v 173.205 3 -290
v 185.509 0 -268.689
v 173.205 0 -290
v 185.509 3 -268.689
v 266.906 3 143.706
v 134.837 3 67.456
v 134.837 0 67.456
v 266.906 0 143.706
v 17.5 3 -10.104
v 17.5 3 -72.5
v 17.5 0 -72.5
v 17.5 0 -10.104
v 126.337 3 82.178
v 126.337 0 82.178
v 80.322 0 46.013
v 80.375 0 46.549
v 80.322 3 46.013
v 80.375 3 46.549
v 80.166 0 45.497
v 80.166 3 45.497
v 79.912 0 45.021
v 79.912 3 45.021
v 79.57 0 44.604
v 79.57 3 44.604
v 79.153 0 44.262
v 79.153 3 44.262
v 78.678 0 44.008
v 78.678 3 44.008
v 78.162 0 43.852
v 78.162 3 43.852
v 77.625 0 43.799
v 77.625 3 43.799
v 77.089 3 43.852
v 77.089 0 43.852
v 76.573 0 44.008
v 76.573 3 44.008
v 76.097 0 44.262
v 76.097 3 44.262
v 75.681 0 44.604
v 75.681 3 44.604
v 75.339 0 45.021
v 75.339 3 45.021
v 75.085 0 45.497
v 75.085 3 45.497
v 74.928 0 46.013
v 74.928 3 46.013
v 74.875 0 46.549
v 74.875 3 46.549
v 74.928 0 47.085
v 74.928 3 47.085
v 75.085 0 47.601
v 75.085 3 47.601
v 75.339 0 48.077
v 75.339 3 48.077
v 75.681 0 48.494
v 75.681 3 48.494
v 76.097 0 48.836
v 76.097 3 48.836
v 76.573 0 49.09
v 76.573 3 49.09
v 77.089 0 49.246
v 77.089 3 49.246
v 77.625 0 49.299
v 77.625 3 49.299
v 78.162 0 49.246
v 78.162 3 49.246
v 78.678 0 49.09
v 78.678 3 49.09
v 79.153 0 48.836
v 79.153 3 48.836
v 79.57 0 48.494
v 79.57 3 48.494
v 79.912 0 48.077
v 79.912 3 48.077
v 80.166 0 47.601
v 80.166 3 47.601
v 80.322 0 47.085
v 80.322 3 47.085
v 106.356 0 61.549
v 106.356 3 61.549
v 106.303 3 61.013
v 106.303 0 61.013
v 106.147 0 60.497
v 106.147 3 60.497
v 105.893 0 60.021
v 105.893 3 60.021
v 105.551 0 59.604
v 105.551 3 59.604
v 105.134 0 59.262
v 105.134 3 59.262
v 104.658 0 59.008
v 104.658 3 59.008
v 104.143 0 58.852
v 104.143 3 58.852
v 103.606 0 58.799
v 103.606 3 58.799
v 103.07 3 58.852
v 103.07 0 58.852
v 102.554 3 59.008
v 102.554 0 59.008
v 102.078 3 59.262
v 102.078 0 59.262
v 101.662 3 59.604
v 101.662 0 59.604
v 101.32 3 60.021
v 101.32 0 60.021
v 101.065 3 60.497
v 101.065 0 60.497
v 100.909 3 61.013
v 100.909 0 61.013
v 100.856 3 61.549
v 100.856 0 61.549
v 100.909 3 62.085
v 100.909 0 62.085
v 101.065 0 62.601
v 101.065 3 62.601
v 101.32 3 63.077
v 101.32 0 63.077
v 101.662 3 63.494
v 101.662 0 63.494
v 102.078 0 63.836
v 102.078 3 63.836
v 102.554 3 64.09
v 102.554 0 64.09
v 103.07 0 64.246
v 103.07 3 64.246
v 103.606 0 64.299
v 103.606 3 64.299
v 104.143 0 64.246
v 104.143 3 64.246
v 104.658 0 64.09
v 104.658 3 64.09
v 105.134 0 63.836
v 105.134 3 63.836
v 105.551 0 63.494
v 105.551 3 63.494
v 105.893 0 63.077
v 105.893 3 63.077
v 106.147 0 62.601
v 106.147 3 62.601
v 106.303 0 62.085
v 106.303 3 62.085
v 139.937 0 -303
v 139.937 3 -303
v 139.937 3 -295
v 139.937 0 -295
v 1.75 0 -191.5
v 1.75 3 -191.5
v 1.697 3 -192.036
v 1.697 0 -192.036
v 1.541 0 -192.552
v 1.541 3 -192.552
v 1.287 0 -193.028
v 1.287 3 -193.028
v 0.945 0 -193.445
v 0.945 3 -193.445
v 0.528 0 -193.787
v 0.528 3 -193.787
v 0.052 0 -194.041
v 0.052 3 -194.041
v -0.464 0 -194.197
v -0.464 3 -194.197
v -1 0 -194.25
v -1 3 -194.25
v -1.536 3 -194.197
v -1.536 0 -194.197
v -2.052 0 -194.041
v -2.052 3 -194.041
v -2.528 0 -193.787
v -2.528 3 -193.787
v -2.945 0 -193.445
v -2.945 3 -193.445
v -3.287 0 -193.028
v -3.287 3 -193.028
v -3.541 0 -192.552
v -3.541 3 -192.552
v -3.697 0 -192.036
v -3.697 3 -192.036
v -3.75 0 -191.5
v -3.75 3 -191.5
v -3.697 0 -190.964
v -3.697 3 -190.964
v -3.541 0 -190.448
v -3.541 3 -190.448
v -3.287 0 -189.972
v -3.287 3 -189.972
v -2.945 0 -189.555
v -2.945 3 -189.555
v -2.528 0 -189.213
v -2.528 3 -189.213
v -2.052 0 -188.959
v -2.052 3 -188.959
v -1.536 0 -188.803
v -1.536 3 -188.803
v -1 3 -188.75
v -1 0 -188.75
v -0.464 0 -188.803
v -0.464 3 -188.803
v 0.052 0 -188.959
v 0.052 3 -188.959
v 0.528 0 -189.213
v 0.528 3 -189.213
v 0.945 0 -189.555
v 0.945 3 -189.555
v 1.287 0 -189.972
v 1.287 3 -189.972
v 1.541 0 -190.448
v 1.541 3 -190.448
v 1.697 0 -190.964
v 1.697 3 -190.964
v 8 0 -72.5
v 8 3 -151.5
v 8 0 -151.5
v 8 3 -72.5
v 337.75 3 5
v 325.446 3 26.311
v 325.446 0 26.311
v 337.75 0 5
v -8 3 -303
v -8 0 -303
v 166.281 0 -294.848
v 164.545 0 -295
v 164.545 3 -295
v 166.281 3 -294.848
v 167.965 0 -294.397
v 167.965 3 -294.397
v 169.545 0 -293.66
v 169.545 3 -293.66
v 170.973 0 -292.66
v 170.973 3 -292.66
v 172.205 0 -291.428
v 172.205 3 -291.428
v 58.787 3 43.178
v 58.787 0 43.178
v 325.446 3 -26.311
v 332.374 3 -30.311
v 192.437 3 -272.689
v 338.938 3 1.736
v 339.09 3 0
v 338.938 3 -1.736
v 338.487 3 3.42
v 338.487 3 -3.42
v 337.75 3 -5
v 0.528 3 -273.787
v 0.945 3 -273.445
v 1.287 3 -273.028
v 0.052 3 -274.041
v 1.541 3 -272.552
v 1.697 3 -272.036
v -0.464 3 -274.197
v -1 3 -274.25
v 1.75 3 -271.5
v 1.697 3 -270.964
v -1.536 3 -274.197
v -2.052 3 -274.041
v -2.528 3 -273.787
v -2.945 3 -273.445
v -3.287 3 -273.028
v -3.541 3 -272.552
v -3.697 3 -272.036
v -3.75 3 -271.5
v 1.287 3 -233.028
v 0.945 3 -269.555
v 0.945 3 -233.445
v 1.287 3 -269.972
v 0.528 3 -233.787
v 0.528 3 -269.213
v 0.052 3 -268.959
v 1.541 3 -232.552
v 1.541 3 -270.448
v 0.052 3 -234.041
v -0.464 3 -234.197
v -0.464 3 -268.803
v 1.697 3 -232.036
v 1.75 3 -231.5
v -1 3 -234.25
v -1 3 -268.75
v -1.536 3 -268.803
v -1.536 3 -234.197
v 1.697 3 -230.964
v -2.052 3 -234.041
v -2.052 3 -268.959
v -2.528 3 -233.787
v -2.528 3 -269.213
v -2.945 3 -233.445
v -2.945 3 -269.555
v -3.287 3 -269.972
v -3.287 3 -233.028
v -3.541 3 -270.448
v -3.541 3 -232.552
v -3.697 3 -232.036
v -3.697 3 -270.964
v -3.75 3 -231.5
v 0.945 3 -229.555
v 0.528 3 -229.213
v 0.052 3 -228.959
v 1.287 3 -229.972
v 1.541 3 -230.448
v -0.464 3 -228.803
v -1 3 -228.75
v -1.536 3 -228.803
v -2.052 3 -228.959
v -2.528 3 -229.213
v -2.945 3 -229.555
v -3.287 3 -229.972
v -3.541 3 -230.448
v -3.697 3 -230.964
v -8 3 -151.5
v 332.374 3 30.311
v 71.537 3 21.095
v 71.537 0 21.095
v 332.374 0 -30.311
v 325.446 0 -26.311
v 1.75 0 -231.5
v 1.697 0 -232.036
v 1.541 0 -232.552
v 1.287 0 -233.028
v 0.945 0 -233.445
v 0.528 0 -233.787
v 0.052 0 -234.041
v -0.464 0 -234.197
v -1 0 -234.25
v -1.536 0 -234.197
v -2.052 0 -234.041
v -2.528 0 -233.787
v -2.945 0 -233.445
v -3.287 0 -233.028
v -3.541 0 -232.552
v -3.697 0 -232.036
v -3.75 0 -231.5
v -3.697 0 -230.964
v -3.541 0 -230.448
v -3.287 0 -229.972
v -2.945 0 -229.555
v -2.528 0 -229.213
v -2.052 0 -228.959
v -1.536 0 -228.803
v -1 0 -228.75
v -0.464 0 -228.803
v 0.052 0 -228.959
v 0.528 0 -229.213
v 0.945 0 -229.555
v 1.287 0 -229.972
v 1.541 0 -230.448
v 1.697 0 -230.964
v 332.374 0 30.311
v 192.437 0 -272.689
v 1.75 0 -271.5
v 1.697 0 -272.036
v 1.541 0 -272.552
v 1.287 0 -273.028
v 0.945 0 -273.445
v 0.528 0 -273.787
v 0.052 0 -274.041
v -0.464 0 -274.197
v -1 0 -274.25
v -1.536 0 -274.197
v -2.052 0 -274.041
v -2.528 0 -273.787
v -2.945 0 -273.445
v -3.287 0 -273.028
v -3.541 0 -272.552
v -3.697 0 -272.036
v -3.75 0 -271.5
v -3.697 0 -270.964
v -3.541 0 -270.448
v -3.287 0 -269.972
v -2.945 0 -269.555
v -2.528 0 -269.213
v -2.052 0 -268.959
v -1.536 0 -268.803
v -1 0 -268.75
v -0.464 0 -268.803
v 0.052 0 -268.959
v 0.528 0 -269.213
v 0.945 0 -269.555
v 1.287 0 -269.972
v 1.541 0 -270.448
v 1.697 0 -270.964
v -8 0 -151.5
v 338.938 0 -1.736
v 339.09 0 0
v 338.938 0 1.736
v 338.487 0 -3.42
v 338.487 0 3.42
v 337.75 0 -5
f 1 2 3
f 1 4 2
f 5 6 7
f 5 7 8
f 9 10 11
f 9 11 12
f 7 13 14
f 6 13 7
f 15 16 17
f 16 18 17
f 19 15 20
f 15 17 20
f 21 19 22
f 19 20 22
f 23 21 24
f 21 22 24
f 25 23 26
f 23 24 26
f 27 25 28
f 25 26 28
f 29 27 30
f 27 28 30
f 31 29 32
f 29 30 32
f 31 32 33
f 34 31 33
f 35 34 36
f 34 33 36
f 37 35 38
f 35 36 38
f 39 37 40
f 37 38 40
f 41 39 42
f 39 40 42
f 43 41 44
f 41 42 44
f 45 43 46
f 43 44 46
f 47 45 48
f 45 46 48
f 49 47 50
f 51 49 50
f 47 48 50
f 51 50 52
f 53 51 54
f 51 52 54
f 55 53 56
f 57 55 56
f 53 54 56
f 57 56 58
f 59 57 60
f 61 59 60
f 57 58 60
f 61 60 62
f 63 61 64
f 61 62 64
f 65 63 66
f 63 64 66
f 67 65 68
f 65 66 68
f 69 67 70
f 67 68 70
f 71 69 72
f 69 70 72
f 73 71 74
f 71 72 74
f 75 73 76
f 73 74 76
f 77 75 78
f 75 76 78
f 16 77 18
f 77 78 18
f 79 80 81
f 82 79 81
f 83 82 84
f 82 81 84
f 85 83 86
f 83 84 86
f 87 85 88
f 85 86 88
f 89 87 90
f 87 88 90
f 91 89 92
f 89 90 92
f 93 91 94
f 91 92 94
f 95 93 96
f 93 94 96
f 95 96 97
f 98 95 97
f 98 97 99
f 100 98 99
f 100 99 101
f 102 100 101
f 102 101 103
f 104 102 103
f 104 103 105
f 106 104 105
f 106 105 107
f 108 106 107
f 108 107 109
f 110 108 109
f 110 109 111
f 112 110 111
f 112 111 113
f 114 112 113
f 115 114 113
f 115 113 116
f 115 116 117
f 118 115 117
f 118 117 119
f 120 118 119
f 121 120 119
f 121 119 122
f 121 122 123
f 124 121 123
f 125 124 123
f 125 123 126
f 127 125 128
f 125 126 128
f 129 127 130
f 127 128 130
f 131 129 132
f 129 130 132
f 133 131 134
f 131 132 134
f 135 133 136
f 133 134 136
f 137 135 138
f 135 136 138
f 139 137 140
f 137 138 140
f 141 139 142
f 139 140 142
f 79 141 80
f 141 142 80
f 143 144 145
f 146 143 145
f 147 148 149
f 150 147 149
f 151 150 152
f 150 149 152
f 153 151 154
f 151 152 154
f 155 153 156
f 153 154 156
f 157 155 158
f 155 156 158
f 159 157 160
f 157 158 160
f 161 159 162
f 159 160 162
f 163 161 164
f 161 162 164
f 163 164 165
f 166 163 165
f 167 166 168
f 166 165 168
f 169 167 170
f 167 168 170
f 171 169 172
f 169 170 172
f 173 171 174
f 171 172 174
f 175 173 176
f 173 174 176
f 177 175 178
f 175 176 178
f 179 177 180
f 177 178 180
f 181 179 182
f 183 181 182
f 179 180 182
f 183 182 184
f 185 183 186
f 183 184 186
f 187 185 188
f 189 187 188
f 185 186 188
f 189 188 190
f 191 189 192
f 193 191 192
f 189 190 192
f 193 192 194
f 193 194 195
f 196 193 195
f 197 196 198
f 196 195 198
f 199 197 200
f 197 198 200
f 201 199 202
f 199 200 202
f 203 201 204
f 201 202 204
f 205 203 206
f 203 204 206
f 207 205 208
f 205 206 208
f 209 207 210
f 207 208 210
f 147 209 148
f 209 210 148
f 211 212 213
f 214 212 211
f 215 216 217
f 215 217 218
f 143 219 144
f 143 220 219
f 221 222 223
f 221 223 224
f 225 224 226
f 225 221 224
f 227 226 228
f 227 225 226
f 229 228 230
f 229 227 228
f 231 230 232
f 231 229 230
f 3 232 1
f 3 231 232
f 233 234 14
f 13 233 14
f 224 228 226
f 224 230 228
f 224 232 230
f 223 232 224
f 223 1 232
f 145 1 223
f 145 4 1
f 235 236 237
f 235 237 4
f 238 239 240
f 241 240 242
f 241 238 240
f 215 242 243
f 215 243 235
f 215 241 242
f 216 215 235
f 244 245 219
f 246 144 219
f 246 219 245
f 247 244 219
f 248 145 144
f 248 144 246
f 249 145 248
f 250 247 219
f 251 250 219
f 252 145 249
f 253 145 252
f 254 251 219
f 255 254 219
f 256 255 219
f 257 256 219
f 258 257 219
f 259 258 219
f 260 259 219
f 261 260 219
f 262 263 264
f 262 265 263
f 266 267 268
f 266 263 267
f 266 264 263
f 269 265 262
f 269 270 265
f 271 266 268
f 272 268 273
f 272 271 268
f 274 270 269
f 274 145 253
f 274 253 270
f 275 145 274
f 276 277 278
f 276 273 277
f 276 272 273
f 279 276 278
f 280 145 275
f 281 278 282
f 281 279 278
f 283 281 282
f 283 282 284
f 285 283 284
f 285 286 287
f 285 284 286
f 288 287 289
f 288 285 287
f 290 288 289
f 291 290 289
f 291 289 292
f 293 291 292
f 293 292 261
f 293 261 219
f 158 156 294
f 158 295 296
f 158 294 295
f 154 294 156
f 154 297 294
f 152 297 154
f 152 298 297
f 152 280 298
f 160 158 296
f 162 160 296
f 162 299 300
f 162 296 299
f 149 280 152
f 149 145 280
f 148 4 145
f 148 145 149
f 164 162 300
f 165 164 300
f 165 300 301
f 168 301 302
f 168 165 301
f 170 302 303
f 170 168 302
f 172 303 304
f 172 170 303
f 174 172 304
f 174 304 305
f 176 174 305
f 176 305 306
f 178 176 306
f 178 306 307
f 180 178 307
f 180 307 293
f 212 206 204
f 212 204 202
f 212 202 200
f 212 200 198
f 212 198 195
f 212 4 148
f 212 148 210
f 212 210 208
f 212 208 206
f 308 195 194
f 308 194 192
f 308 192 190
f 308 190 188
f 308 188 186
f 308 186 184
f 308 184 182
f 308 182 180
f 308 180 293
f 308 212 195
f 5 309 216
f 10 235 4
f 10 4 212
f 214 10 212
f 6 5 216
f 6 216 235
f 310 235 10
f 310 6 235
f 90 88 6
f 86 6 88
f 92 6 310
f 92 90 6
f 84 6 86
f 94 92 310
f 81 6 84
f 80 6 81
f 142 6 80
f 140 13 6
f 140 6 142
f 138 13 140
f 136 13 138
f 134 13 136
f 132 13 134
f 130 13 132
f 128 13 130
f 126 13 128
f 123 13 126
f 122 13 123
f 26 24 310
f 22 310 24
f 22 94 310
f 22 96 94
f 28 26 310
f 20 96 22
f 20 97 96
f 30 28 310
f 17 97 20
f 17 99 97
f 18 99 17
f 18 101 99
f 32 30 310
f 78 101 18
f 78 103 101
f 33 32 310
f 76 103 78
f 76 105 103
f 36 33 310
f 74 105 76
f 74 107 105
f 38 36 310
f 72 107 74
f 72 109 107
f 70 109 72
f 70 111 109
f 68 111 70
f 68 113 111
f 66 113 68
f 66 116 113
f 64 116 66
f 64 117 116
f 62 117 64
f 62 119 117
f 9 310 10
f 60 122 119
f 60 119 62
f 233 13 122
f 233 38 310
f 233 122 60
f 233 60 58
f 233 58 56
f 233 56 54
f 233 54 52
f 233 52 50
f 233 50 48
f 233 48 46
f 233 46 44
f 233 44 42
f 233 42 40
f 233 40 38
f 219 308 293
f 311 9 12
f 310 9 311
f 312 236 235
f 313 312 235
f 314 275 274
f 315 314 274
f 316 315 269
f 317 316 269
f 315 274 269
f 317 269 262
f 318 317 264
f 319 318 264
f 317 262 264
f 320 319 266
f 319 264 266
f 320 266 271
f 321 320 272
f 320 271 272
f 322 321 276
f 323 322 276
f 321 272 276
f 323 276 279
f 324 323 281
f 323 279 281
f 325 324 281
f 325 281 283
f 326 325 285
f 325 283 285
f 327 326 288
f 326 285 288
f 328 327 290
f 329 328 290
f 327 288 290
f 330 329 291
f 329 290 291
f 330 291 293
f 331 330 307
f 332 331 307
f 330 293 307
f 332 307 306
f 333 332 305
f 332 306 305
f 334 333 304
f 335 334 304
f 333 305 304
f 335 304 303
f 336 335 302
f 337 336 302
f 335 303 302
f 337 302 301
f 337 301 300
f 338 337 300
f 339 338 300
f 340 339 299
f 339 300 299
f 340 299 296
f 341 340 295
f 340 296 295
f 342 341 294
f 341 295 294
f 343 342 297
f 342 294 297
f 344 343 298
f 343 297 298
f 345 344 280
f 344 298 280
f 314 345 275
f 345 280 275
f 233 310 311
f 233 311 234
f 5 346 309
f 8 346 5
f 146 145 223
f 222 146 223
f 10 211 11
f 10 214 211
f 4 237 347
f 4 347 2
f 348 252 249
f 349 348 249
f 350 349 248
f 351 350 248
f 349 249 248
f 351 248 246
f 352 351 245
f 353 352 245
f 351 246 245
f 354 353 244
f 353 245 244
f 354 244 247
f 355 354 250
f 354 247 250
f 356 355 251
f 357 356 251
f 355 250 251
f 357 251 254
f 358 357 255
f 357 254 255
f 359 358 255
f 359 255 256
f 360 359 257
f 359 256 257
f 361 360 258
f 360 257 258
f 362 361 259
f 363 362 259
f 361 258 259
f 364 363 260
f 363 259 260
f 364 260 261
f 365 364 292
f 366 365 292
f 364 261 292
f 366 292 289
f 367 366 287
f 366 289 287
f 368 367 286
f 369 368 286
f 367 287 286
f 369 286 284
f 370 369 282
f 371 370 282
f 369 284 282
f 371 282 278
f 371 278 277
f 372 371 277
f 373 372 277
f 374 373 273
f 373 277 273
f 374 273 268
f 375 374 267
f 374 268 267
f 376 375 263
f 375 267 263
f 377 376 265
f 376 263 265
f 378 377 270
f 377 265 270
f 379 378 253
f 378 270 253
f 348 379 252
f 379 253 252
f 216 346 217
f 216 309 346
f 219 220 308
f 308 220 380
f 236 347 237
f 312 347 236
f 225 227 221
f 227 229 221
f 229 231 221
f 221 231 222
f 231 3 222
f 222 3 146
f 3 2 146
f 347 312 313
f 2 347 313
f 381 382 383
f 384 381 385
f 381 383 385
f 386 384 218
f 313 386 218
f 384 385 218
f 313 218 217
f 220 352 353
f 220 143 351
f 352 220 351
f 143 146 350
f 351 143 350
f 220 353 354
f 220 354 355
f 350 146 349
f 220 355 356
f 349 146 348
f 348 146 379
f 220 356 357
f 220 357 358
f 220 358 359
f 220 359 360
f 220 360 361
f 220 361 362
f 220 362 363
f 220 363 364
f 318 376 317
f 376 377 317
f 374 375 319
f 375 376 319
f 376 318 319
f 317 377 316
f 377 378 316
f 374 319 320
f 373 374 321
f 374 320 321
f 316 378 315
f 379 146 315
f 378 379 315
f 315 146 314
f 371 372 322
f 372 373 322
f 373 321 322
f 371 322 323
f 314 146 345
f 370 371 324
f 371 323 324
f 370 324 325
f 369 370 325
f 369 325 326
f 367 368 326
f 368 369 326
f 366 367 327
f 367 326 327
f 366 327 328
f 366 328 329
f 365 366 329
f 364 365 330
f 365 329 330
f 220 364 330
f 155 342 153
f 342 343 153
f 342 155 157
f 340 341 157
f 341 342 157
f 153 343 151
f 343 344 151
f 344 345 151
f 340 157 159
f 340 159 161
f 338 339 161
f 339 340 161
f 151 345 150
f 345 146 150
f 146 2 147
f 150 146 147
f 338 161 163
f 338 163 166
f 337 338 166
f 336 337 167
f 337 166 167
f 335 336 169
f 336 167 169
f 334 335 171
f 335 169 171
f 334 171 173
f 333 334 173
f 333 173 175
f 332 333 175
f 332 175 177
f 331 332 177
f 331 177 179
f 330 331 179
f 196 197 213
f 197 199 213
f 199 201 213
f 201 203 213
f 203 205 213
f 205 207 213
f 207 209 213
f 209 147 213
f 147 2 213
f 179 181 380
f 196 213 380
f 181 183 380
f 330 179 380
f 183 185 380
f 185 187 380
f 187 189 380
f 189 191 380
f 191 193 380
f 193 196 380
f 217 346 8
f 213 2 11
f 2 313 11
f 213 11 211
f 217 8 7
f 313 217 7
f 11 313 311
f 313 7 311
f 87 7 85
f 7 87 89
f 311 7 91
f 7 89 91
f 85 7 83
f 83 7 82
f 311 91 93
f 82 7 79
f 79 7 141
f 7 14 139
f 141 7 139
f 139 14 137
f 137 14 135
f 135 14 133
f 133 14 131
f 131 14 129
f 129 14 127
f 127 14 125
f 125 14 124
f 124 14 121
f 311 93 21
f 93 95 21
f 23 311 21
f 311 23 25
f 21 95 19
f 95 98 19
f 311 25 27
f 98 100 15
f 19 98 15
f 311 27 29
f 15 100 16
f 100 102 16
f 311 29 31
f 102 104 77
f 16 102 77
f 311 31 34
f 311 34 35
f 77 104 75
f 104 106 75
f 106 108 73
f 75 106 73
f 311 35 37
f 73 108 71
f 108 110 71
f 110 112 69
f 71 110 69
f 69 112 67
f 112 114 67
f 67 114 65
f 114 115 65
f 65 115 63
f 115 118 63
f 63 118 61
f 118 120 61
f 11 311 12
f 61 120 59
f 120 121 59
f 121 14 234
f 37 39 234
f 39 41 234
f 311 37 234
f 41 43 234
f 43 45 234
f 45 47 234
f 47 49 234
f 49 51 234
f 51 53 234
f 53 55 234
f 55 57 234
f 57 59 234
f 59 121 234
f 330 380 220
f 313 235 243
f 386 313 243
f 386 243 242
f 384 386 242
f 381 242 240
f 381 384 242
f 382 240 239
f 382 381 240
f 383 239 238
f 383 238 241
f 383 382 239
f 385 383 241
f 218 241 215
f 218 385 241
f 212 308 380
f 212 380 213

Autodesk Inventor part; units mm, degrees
ref_plane "YZ Plane" through (0, 0, 0) normal (1, 0, 0) x (0, 1, 0)
ref_plane "XZ Plane" through (0, 0, 0) normal (0, 1, 0) x (-1, 0, 0)
ref_plane "XY Plane" through (0, 0, 0) normal (0, 0, 1) x (1, 0, 0)
sketch "Sketch1" plane through (0, 0, 0) normal (0, 1, 0) x (-1, 0, 0)
  line L0 (349.8743, 0) -> (258.4057, -158.4282)
  line L1 (174.9371, -303) -> (-174.9371, -303)
  line L2 (-174.9371, -303) -> (-349.8743, 0)
  line L3 (-349.8743, 0) -> (-174.9371, 303)
  line L4 (-174.9371, 303) -> (174.9371, 303)
  line L5 (258.4057, 158.4282) -> (349.8743, 0)
  line L6 (0, 0) -> (-8, 0)
  line L7 (-8, 0) -> (-8, -303)
  line L8 (-8, -303) -> (8, -303)
  line L9 (8, -303) -> (8, 0)
  line L10 (8, 0) -> (-8, 0)
  circle A0 centre (0, 0) radius 2.5
  line L11 (258.4057, 158.4282) -> (-4, 6.9282)
  line L12 (4, -6.9282) -> (266.4057, 144.5718)
  line L13 (-4, 6.9282) -> (4, -6.9282)
  line L14 (-266.4057, 144.5718) -> (-4, -6.9282)
  line L15 (4, 6.9282) -> (-258.4057, 158.4282)
  line L16 (-4, -6.9282) -> (4, 6.9282)
  line L17 (8, -4.6188) -> (8, -151.5)
  line L18 (8, -151.5) -> (-8, -151.5)
  line L19 (-8, -151.5) -> (-8, -303)
  line L20 (-8, -4.6188) -> (-4, -6.9282)
  line L21 (4, -6.9282) -> (-4, -6.9282)
  line L22 (-266.4057, 144.5718) -> (-258.4057, 158.4282)
  line L23 (-127.2028, 82.6782) -> (-135.2028, 68.8218)
  line L24 (-135.2028, 68.8218) -> (-8, -4.6188)
  line L25 (-266.4057, 144.5718) -> (-349.8743, 0)
  line L26 (-174.9371, -303) -> (-349.8743, 0)
  line L27 (-174.9371, -303) -> (-8, -303)
  line L28 (0, 9.2376) -> (8, 0)
  dimension "d0" = 303
  dimension "d1" = 303
  dimension "d2" = 8
  dimension "d3" = 16
  dimension "d4" = 5
  dimension "d7" = 360
extrude "Extrusion1" add sketch "Sketch1" along normal blind 3 contours L1 L7 L18 L9 | L1 L2 L3 L14 L7 | L18 L7 L14 L21 L12 L9 | L12 L13 A0 L10 L9 | L14 L23 L15 L11 L13 A0 L6 L7 | L7 L6 A0 L16 L14 | L10 A0 L16 L28 | L21 L16 A0 L13 | L3 L15 L23 L14 | A0 L13 L10 | L10 L16 A0 | L28 L15 L16 | L16 A0 L13 L11 L28 | A0 L16 L13 | A0 L13 L6 | L6 L16 A0 | L13 A0 L16
sketch "Sketch2" plane through (0, 3, 0) normal (0, 1, 0) x (1, 0, 0)
  line L0 (-8, 303) -> (-8, 0) projected
  line L1 (-8, 0) -> (-8, 151.5)
  line L2 (-8, 151.5) -> (8, 151.5)
  line L3 (8, 151.5) -> (8, 0)
  line L4 (8, 0) -> (-8, 0)
  line L5 (0, -9.2376) -> (258.4057, -158.4282) projected
  line L6 (258.4057, -158.4282) -> (126.3368, -82.1782)
  line L7 (126.3368, -82.1782) -> (134.8368, -67.4558)
  line L8 (134.8368, -67.4558) -> (266.9057, -143.7058)
  line L9 (266.9057, -143.7058) -> (258.4057, -158.4282)
  point P0 (0, 0)
  dimension "d11" = 151.5
  dimension "d12" = 16
  dimension "d13" = 152.5
  dimension "d14" = 17
extrude "Extrusion2" cut sketch "Sketch2" against normal blind 3
sketch "Sketch3" plane through (0, 3, 0) normal (0, 1, 0) x (1, 0, 0)
  line L0 (174.9371, 303) -> (-8, 303) projected
  line L1 (174.9371, 303) -> (139.9371, 303)
  line L2 (139.9371, 303) -> (139.9371, 295)
  line L3 (139.9371, 295) -> (174.9371, 295)
  line L4 (174.9371, 295) -> (174.9371, 303)
  line L5 (349.8743, 0) -> (174.9371, 303) projected
  line L6 (174.9371, 303) -> (192.4371, 272.6891)
  line L7 (192.4371, 272.6891) -> (185.5089, 268.6891)
  line L8 (185.5089, 268.6891) -> (168.0089, 299)
  line L9 (168.0089, 299) -> (174.9371, 303)
  line L10 (349.8743, 0) -> (332.3743, 30.3109)
  line L11 (332.3743, 30.3109) -> (325.4461, 26.3109)
  line L12 (325.4461, 26.3109) -> (342.9461, -4)
  line L13 (342.9461, -4) -> (349.8743, 0)
  line L14 (349.8743, 0) -> (332.3743, -30.3109)
  line L15 (332.3743, -30.3109) -> (325.4461, -26.3109)
  line L16 (325.4461, -26.3109) -> (342.9461, 4)
  line L17 (342.9461, 4) -> (349.8743, 0)
  line L18 (349.8743, 0) -> (266.9057, -143.7058) projected
  line L19 (349.8743, 0) -> (384.8743, 0) construction
  point P0 (0, 0)
  dimension "d17" = 35
  dimension "d18" = 8
  dimension "d19" = 35
  dimension "d20" = 8
  dimension "d21" = 35
  dimension "d22" = 8
  dimension "d23" = 35
  dimension "d24" = 120
  dimension "d25" = 8
extrude "Extrusion3" cut sketch "Sketch3" against normal blind 3
sketch "Sketch4" plane through (0, 3, 0) normal (0, 1, 0) x (1, 0, 0)
  line L0 (-54.0368, 51.4054) -> (71.5368, -21.0946)
  line L1 (71.5368, -21.0946) -> (54.0368, -51.4054)
  line L2 (54.0368, -51.4054) -> (-71.5368, 21.0946)
  line L3 (-71.5368, 21.0946) -> (-54.0368, 51.4054)
  line L4 (-54.0368, 51.4054) -> (54.0368, -51.4054) construction
  line L5 (71.5368, -21.0946) -> (-71.5368, 21.0946) construction
  line L6 (-54.0368, 51.4054) -> (90.9632, 51.4054) construction
  line L7 (-17.5, -72.5) -> (-17.5, 72.5)
  line L8 (-17.5, 72.5) -> (17.5, 72.5)
  line L9 (17.5, 72.5) -> (17.5, -72.5)
  line L10 (17.5, -72.5) -> (-17.5, -72.5)
  line L11 (-17.5, -72.5) -> (17.5, 72.5) construction
  line L12 (-17.5, 72.5) -> (17.5, -72.5) construction
  line L13 (-8, 0) -> (8, 0) projected
  line L14 (-17.5, -72.5) -> (127.5, -72.5) construction
  point P0 (0, 0)
  dimension "d28" = 145
  dimension "d29" = 30
  dimension "d30" = 35
  dimension "d31" = 145
  dimension "d32" = 90
  dimension "d33" = 35
extrude "Extrusion4" cut sketch "Sketch4" against normal blind 3
sketch "Sketch5" plane through (0, 3, 0) normal (0, 1, 0) x (1, 0, 0)
  line L0 (-1, 151.5) -> (-1, 191.5)
  circle A0 centre (-1, 191.5) radius 2.75
  circle A1 centre (-1, 231.5) radius 2.75
  circle A2 centre (-1, 271.5) radius 2.75
  circle A3 centre (0, 0) radius 0.5
  line L1 (126.3368, -82.1782) -> (134.8368, -67.4558) projected
  line L2 (126.3368, -82.1782) -> (129.5868, -76.549)
  line L3 (129.5868, -76.549) -> (103.6061, -61.549)
  line L4 (103.6061, -61.549) -> (77.6253, -46.549)
  circle A4 centre (103.6061, -61.549) radius 2.75
  circle A5 centre (77.6253, -46.549) radius 2.75
  line L5 (-8, 303) -> (-8, 151.5) projected
  dimension "d36" = 40
  dimension "d37" = 5.5
  dimension "d40" = 40
  dimension "d45" = 1
  dimension "d46" = 6.5
  dimension "d47" = 30
  dimension "d48" = 30
  dimension "d49" = 5.5
  dimension "d50" = 5.5
  dimension "d53" = 7
extrude "Extrusion5" cut sketch "Sketch5" against normal blind 3 contours A0 | A1 | A2 | A4 L4 L3 | A5 | L3 L4 A4
sketch "Sketch6" plane through (0, 3, 0) normal (0, 1, 0) x (1, 0, 0)
  line L0 (-8, 303) -> (-8, 151.5) projected
  line L1 (-8, 303) -> (344, 303)
  line L2 (344, 303) -> (344, -147)
  line L3 (344, -147) -> (-8, -147)
  line L4 (-8, -147) -> (-8, 303)
  point P0 (0, 0)
  dimension "d54" = 352
  dimension "d55" = 450
sketch "Sketch7" plane through (0, 3, 0) normal (0, 1, 0) x (1, 0, 0)
  line L0 (139.9371, 303) -> (-8, 303) projected
  line L1 (-8, 303) -> (343, 303)
  line L2 (343, 303) -> (343, -144)
  line L3 (343, -144) -> (-8, -144)
  line L4 (-8, -144) -> (-8, 303)
  point P0 (0, 0)
  dimension "d56" = 351
  dimension "d57" = 447
fillet "Fillet1" radius 10 2 edges at (340.6367, 1.5, 0) (170.3183, 1.5, -295)
properties part number "Acrylic_bottom"
